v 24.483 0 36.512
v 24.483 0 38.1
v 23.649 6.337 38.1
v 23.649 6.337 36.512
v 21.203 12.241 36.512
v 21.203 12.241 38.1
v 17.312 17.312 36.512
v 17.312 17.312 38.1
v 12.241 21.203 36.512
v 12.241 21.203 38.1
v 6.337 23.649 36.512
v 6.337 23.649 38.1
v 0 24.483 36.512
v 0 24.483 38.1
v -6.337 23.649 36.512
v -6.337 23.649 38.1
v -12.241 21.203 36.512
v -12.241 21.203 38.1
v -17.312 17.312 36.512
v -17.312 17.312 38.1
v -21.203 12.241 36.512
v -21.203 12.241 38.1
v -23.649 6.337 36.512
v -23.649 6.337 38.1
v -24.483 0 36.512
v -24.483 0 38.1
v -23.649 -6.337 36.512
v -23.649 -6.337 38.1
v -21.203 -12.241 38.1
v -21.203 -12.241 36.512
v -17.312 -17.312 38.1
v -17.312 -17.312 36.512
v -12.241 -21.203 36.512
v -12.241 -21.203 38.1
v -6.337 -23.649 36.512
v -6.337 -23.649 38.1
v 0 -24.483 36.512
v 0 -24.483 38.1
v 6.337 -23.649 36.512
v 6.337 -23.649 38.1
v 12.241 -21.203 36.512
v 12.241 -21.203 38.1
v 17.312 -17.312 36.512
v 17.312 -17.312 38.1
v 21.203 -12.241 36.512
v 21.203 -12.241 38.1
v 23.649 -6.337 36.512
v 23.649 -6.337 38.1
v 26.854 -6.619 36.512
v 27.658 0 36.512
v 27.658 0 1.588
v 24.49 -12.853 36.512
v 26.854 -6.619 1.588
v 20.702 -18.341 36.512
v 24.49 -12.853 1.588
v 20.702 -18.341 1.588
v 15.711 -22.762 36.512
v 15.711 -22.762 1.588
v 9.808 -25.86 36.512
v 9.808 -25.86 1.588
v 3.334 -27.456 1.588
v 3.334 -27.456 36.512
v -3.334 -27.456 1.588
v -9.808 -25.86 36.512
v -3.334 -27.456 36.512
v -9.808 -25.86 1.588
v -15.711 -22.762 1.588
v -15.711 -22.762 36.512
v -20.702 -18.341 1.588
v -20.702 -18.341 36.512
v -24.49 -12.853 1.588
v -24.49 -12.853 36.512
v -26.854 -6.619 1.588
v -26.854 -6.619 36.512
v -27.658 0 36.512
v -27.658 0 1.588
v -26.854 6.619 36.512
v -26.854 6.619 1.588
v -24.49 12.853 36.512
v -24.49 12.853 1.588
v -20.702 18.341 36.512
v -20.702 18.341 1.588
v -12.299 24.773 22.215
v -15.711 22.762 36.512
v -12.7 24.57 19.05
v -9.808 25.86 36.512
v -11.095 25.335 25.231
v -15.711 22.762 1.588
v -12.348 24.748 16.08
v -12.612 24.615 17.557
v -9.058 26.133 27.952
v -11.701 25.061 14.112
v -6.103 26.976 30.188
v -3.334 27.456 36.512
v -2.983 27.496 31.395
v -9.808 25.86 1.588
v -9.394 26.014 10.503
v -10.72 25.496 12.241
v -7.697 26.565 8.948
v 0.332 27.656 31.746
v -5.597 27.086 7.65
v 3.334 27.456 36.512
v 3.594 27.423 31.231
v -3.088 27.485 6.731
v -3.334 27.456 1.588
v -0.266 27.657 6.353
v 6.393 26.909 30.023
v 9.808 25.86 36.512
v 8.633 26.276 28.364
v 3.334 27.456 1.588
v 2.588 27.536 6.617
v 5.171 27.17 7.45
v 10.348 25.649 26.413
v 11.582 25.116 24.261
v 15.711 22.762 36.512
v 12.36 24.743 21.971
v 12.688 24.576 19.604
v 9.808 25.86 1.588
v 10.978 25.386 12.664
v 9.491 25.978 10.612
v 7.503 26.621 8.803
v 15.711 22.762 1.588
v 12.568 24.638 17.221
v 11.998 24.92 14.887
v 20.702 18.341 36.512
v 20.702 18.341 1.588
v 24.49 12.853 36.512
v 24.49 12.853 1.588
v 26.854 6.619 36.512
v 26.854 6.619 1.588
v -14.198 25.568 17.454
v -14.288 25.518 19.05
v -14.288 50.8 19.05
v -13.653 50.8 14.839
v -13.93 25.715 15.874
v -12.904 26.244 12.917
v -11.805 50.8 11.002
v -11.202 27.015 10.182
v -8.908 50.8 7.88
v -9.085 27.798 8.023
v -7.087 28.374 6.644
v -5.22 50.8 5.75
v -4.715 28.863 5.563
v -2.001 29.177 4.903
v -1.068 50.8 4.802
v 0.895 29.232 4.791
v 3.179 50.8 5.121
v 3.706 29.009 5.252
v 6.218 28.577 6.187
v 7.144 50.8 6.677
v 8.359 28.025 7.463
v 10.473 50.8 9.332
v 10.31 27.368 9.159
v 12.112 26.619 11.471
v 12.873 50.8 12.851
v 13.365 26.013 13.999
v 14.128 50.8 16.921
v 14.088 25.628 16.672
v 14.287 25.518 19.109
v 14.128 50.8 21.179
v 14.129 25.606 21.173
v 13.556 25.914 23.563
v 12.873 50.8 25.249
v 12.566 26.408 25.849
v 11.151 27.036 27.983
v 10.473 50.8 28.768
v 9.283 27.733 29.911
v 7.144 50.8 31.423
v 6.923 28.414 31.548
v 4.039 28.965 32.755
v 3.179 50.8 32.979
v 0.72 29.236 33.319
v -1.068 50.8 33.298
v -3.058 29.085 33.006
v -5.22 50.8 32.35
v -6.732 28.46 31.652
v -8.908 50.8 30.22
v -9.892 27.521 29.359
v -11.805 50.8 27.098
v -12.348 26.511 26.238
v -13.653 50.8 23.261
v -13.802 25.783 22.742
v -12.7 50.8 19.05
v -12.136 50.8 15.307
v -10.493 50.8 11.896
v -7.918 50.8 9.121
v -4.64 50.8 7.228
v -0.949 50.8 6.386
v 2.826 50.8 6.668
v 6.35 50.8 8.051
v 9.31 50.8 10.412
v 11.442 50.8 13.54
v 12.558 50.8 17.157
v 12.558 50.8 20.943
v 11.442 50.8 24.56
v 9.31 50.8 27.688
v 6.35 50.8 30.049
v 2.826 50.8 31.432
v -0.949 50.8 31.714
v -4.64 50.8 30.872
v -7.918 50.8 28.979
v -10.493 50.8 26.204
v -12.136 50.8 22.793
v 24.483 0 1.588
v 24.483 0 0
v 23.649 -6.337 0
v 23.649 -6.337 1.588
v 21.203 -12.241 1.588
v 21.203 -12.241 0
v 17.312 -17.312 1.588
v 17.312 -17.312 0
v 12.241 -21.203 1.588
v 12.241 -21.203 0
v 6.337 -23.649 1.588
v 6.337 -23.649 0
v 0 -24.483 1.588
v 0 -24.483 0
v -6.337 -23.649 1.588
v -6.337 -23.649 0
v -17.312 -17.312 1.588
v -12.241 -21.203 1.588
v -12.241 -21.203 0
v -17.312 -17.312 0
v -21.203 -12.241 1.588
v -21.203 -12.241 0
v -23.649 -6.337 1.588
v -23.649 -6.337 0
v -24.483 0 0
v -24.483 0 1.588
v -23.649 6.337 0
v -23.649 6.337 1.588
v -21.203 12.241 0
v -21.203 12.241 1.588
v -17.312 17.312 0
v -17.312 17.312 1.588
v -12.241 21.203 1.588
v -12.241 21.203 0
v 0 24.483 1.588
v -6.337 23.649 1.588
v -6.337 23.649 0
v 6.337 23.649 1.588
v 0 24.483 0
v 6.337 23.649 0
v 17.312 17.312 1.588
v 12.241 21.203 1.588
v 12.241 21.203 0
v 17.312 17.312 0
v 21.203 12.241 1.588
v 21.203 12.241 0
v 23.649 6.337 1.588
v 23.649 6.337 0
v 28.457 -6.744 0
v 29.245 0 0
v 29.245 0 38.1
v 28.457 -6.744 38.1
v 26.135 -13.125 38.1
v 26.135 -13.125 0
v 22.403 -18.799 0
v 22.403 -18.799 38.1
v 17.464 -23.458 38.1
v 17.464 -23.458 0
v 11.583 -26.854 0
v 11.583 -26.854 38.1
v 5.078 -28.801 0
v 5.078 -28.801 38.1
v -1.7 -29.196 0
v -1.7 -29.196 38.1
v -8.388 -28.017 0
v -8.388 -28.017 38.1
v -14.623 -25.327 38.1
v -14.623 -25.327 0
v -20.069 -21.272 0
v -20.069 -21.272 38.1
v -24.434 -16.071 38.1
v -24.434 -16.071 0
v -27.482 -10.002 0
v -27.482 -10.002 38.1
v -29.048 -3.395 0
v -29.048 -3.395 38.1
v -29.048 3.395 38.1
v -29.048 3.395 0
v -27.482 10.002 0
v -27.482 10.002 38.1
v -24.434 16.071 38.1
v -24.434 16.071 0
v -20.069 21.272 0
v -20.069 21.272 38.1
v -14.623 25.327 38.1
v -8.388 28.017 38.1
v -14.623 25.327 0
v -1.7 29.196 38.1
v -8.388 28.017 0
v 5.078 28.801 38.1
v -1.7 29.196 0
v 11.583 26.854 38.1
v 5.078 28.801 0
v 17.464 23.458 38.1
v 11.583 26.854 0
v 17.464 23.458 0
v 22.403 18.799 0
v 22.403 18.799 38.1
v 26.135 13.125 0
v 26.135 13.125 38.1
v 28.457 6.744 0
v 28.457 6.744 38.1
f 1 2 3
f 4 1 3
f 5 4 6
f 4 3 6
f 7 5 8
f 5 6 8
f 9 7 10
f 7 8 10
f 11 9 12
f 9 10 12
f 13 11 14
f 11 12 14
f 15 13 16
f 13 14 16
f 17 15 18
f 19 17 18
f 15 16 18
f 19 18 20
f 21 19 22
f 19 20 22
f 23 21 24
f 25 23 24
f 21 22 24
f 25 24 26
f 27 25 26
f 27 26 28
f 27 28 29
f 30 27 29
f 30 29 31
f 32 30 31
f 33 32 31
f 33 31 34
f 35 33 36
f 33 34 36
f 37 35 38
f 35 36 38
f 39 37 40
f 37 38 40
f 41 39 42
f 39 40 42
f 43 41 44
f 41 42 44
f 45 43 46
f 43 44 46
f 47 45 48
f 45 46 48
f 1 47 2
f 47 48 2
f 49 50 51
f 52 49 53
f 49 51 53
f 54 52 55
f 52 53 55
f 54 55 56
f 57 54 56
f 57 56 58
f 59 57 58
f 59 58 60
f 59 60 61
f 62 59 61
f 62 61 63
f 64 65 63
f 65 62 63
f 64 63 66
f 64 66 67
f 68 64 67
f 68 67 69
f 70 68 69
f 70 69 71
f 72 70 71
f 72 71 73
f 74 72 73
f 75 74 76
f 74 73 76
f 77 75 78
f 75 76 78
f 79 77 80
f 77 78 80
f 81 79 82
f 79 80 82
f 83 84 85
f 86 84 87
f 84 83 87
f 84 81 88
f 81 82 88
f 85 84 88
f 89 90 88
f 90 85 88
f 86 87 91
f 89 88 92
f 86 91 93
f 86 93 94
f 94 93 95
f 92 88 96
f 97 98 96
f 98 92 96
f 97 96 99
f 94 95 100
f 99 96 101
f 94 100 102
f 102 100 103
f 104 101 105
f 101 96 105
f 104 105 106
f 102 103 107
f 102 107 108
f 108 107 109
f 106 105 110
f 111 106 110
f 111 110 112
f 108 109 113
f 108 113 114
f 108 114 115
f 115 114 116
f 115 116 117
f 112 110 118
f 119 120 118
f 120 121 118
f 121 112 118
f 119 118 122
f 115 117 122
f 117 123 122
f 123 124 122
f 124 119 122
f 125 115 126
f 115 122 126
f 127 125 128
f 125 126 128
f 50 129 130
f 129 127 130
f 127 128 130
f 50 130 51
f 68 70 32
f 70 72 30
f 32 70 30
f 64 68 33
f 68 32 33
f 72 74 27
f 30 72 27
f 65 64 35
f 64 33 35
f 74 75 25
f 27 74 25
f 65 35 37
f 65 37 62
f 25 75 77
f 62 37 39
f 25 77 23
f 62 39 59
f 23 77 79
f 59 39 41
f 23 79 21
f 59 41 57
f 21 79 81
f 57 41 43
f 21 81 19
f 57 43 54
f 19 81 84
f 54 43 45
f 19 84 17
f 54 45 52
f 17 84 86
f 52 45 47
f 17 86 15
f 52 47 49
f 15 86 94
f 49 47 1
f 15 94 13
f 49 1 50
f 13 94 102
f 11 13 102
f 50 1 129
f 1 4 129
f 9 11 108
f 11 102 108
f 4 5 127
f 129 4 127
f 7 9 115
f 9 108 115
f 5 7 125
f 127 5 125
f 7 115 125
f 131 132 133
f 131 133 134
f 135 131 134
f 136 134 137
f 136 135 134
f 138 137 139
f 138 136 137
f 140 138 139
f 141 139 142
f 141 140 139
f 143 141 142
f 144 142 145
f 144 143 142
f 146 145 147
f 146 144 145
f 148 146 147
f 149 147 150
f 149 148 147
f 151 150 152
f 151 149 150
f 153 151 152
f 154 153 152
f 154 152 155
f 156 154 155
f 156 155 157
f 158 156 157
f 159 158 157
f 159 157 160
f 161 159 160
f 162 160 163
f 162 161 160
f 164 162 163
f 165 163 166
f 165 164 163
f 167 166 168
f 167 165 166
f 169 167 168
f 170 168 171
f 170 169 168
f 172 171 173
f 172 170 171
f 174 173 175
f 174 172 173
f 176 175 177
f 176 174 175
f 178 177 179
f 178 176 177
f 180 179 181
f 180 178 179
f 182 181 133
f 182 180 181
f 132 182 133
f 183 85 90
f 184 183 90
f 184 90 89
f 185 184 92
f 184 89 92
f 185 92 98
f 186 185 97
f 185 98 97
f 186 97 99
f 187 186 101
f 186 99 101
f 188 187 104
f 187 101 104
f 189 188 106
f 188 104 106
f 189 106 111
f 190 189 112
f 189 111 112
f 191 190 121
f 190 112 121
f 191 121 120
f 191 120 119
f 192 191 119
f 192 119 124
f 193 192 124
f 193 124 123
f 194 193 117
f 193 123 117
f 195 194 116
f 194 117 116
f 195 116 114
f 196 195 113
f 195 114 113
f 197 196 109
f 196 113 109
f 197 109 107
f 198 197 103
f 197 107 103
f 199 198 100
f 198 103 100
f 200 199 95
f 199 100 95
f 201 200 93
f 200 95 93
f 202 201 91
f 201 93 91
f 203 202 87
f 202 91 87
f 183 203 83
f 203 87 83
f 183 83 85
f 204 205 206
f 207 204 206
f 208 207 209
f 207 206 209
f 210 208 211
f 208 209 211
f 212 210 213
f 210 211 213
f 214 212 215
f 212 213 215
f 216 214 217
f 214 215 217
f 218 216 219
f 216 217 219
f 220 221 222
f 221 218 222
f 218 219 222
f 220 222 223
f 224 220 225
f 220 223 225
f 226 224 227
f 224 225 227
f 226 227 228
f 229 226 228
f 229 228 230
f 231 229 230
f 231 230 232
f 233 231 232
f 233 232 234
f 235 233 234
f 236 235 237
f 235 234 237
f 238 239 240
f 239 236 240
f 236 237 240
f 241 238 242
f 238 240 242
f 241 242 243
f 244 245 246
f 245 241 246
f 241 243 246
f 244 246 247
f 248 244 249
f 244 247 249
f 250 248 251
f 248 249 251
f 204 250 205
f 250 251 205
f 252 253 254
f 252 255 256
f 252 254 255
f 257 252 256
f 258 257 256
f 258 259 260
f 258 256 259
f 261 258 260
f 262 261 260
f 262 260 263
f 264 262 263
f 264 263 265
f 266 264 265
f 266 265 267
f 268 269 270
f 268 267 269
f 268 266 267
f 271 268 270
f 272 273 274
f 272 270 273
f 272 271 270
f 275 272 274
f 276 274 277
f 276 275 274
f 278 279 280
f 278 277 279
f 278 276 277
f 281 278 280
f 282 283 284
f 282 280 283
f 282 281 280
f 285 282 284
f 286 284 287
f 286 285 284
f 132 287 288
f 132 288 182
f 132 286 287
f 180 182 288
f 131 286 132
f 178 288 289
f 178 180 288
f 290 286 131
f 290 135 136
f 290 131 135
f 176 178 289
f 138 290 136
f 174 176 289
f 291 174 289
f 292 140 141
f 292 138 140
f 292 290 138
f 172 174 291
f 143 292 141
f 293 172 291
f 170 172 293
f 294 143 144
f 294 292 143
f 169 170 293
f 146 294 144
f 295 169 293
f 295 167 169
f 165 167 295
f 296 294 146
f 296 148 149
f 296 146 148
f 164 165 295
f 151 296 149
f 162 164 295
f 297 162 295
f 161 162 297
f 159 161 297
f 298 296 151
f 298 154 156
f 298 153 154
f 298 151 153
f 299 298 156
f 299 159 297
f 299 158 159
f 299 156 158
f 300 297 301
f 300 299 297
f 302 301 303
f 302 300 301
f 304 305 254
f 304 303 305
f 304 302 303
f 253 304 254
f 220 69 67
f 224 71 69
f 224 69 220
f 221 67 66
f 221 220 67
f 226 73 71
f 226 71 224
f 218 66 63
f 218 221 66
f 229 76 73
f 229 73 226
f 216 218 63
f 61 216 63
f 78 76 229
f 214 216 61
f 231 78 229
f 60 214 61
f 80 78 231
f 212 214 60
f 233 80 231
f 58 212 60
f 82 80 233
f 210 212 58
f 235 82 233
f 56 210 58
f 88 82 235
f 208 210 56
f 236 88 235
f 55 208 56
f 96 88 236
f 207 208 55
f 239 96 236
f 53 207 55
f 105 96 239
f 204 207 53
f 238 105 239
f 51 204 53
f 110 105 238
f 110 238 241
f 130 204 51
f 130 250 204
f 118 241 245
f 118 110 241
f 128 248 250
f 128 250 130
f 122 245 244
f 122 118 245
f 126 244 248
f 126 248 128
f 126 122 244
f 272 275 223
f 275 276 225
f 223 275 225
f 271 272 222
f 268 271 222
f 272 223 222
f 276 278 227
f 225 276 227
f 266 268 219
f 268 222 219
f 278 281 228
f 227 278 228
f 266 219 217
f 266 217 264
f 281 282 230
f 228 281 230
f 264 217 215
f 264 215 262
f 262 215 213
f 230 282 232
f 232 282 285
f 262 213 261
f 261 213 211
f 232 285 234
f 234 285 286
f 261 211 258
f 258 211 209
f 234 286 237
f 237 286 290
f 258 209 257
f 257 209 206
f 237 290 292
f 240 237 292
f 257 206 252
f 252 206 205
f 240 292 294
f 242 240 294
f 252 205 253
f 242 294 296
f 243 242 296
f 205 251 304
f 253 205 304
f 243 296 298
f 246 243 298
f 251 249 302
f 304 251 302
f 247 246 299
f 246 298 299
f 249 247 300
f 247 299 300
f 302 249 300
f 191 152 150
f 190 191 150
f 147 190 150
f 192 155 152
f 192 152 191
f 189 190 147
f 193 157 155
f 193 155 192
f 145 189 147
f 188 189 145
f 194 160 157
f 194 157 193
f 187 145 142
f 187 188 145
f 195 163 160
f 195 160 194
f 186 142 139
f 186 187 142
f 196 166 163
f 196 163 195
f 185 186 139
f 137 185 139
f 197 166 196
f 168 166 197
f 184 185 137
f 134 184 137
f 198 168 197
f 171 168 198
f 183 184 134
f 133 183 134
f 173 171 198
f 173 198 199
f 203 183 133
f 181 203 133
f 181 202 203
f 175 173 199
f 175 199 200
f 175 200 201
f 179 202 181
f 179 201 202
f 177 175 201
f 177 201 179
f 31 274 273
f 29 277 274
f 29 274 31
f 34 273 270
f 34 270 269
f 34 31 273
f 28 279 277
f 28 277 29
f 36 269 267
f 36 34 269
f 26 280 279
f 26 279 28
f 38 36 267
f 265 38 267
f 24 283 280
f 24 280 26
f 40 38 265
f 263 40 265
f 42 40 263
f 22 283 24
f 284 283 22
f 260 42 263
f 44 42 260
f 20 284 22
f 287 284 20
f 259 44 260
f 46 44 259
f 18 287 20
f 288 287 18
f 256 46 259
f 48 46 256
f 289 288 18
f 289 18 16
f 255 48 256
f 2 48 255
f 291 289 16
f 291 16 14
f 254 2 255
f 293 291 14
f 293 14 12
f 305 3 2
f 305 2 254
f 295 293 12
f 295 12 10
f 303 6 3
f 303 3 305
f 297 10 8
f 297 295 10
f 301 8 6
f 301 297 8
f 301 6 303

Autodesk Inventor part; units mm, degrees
ref_plane "YZ Plane" through (0, 0, 0) normal (1, 0, 0) x (0, 1, 0)
ref_plane "XZ Plane" through (0, 0, 0) normal (0, 1, 0) x (-1, 0, 0)
sketch "Sketch1" plane through (0, 0, 0) normal (0, 0, 1) x (1, 0, 0)
  circle A0 centre (0, 0) radius 14.2875
  circle A1 centre (0, 0) radius 17.4625
  circle A2 centre (0, 0) radius 19.05
  circle A3 centre (0, 0) radius 22.8953
  circle A4 centre (0, 0) radius 24.4828
  circle A5 centre (0, 0) radius 27.6578
  circle A6 centre (0, 0) radius 29.2453
  dimension "d0" = 28.575
  dimension "d1" = 34.925
  dimension "d2" = 38.1
  dimension "d3" = 45.7905
  dimension "d4" = 48.9655
  dimension "d5" = 55.3155
  dimension "d6" = 58.4905
extrude "Extrusion1" add sketch "Sketch1" along normal blind 38.1 contours A0 | A1 | A2 | A3 | A4 | A5 | A6
sketch "Sketch2" plane through (0, 0, 0) normal (0, 1, 0) x (-1, 0, 0)
  circle A0 centre (0, 19.05) radius 14.2875
  line L0 (29.2453, 0) -> (-29.2453, 0) projected
  point P0 (0, 0)
  dimension "d9" = 19.05
  dimension "d10" = 28.575
extrude "Extrusion2" add sketch "Sketch2" along normal blind 50.8
shell "Shell1" thickness 1.5875 removed faces 3 at (13.4185, 9.6773, 0) at (13.4185, 9.6773, 38.1) at (-3.9719, 50.8, 19.2449)
sketch "Sketch3" plane through (0, 0, 0) normal (0, 0, 1) x (1, 0, 0)
  circle A0 centre (0, 0) radius 14.2875
  circle A1 centre (0, 0) radius 17.4625
  circle A2 centre (0, 0) radius 19.05
  circle A3 centre (0, 0) radius 22.8953
  circle A4 centre (0, 0) radius 24.4828
  circle A5 centre (0, 0) radius 27.6578
  circle A6 centre (0, 0) radius 29.2453
  dimension "d14" = 28.575
  dimension "d15" = 34.925
  dimension "d16" = 38.1
  dimension "d17" = 45.7905
  dimension "d18" = 48.9655
  dimension "d19" = 55.3155
  dimension "d20" = 58.4905
extrude "Extrusion3" add sketch "Sketch3" along normal blind 1.5875 contours A5
ref_plane "Work Plane1" through (0, 0, 38.1) normal (0, 0, 1) x (1, 0, 0)
sketch "Sketch4" plane through (0, 0, 38.1) normal (0, 0, 1) x (1, 0, 0)
  circle A0 centre (0, 0) radius 14.2875
  circle A1 centre (0, 0) radius 17.4625
  circle A2 centre (0, 0) radius 19.05
  circle A3 centre (0, 0) radius 22.8953
  circle A4 centre (0, 0) radius 24.4828
  circle A5 centre (0, 0) radius 27.6578
  circle A6 centre (0, 0) radius 29.2453
  dimension "d24" = 28.575
  dimension "d25" = 34.925
  dimension "d26" = 38.1
  dimension "d27" = 45.7905
  dimension "d28" = 48.9655
  dimension "d29" = 55.3155
  dimension "d30" = 58.4905
extrude "Extrusion4" add sketch "Sketch4" against normal blind 1.5875 contours A5
properties part number "Exhaust" material "Stainless Steel"
